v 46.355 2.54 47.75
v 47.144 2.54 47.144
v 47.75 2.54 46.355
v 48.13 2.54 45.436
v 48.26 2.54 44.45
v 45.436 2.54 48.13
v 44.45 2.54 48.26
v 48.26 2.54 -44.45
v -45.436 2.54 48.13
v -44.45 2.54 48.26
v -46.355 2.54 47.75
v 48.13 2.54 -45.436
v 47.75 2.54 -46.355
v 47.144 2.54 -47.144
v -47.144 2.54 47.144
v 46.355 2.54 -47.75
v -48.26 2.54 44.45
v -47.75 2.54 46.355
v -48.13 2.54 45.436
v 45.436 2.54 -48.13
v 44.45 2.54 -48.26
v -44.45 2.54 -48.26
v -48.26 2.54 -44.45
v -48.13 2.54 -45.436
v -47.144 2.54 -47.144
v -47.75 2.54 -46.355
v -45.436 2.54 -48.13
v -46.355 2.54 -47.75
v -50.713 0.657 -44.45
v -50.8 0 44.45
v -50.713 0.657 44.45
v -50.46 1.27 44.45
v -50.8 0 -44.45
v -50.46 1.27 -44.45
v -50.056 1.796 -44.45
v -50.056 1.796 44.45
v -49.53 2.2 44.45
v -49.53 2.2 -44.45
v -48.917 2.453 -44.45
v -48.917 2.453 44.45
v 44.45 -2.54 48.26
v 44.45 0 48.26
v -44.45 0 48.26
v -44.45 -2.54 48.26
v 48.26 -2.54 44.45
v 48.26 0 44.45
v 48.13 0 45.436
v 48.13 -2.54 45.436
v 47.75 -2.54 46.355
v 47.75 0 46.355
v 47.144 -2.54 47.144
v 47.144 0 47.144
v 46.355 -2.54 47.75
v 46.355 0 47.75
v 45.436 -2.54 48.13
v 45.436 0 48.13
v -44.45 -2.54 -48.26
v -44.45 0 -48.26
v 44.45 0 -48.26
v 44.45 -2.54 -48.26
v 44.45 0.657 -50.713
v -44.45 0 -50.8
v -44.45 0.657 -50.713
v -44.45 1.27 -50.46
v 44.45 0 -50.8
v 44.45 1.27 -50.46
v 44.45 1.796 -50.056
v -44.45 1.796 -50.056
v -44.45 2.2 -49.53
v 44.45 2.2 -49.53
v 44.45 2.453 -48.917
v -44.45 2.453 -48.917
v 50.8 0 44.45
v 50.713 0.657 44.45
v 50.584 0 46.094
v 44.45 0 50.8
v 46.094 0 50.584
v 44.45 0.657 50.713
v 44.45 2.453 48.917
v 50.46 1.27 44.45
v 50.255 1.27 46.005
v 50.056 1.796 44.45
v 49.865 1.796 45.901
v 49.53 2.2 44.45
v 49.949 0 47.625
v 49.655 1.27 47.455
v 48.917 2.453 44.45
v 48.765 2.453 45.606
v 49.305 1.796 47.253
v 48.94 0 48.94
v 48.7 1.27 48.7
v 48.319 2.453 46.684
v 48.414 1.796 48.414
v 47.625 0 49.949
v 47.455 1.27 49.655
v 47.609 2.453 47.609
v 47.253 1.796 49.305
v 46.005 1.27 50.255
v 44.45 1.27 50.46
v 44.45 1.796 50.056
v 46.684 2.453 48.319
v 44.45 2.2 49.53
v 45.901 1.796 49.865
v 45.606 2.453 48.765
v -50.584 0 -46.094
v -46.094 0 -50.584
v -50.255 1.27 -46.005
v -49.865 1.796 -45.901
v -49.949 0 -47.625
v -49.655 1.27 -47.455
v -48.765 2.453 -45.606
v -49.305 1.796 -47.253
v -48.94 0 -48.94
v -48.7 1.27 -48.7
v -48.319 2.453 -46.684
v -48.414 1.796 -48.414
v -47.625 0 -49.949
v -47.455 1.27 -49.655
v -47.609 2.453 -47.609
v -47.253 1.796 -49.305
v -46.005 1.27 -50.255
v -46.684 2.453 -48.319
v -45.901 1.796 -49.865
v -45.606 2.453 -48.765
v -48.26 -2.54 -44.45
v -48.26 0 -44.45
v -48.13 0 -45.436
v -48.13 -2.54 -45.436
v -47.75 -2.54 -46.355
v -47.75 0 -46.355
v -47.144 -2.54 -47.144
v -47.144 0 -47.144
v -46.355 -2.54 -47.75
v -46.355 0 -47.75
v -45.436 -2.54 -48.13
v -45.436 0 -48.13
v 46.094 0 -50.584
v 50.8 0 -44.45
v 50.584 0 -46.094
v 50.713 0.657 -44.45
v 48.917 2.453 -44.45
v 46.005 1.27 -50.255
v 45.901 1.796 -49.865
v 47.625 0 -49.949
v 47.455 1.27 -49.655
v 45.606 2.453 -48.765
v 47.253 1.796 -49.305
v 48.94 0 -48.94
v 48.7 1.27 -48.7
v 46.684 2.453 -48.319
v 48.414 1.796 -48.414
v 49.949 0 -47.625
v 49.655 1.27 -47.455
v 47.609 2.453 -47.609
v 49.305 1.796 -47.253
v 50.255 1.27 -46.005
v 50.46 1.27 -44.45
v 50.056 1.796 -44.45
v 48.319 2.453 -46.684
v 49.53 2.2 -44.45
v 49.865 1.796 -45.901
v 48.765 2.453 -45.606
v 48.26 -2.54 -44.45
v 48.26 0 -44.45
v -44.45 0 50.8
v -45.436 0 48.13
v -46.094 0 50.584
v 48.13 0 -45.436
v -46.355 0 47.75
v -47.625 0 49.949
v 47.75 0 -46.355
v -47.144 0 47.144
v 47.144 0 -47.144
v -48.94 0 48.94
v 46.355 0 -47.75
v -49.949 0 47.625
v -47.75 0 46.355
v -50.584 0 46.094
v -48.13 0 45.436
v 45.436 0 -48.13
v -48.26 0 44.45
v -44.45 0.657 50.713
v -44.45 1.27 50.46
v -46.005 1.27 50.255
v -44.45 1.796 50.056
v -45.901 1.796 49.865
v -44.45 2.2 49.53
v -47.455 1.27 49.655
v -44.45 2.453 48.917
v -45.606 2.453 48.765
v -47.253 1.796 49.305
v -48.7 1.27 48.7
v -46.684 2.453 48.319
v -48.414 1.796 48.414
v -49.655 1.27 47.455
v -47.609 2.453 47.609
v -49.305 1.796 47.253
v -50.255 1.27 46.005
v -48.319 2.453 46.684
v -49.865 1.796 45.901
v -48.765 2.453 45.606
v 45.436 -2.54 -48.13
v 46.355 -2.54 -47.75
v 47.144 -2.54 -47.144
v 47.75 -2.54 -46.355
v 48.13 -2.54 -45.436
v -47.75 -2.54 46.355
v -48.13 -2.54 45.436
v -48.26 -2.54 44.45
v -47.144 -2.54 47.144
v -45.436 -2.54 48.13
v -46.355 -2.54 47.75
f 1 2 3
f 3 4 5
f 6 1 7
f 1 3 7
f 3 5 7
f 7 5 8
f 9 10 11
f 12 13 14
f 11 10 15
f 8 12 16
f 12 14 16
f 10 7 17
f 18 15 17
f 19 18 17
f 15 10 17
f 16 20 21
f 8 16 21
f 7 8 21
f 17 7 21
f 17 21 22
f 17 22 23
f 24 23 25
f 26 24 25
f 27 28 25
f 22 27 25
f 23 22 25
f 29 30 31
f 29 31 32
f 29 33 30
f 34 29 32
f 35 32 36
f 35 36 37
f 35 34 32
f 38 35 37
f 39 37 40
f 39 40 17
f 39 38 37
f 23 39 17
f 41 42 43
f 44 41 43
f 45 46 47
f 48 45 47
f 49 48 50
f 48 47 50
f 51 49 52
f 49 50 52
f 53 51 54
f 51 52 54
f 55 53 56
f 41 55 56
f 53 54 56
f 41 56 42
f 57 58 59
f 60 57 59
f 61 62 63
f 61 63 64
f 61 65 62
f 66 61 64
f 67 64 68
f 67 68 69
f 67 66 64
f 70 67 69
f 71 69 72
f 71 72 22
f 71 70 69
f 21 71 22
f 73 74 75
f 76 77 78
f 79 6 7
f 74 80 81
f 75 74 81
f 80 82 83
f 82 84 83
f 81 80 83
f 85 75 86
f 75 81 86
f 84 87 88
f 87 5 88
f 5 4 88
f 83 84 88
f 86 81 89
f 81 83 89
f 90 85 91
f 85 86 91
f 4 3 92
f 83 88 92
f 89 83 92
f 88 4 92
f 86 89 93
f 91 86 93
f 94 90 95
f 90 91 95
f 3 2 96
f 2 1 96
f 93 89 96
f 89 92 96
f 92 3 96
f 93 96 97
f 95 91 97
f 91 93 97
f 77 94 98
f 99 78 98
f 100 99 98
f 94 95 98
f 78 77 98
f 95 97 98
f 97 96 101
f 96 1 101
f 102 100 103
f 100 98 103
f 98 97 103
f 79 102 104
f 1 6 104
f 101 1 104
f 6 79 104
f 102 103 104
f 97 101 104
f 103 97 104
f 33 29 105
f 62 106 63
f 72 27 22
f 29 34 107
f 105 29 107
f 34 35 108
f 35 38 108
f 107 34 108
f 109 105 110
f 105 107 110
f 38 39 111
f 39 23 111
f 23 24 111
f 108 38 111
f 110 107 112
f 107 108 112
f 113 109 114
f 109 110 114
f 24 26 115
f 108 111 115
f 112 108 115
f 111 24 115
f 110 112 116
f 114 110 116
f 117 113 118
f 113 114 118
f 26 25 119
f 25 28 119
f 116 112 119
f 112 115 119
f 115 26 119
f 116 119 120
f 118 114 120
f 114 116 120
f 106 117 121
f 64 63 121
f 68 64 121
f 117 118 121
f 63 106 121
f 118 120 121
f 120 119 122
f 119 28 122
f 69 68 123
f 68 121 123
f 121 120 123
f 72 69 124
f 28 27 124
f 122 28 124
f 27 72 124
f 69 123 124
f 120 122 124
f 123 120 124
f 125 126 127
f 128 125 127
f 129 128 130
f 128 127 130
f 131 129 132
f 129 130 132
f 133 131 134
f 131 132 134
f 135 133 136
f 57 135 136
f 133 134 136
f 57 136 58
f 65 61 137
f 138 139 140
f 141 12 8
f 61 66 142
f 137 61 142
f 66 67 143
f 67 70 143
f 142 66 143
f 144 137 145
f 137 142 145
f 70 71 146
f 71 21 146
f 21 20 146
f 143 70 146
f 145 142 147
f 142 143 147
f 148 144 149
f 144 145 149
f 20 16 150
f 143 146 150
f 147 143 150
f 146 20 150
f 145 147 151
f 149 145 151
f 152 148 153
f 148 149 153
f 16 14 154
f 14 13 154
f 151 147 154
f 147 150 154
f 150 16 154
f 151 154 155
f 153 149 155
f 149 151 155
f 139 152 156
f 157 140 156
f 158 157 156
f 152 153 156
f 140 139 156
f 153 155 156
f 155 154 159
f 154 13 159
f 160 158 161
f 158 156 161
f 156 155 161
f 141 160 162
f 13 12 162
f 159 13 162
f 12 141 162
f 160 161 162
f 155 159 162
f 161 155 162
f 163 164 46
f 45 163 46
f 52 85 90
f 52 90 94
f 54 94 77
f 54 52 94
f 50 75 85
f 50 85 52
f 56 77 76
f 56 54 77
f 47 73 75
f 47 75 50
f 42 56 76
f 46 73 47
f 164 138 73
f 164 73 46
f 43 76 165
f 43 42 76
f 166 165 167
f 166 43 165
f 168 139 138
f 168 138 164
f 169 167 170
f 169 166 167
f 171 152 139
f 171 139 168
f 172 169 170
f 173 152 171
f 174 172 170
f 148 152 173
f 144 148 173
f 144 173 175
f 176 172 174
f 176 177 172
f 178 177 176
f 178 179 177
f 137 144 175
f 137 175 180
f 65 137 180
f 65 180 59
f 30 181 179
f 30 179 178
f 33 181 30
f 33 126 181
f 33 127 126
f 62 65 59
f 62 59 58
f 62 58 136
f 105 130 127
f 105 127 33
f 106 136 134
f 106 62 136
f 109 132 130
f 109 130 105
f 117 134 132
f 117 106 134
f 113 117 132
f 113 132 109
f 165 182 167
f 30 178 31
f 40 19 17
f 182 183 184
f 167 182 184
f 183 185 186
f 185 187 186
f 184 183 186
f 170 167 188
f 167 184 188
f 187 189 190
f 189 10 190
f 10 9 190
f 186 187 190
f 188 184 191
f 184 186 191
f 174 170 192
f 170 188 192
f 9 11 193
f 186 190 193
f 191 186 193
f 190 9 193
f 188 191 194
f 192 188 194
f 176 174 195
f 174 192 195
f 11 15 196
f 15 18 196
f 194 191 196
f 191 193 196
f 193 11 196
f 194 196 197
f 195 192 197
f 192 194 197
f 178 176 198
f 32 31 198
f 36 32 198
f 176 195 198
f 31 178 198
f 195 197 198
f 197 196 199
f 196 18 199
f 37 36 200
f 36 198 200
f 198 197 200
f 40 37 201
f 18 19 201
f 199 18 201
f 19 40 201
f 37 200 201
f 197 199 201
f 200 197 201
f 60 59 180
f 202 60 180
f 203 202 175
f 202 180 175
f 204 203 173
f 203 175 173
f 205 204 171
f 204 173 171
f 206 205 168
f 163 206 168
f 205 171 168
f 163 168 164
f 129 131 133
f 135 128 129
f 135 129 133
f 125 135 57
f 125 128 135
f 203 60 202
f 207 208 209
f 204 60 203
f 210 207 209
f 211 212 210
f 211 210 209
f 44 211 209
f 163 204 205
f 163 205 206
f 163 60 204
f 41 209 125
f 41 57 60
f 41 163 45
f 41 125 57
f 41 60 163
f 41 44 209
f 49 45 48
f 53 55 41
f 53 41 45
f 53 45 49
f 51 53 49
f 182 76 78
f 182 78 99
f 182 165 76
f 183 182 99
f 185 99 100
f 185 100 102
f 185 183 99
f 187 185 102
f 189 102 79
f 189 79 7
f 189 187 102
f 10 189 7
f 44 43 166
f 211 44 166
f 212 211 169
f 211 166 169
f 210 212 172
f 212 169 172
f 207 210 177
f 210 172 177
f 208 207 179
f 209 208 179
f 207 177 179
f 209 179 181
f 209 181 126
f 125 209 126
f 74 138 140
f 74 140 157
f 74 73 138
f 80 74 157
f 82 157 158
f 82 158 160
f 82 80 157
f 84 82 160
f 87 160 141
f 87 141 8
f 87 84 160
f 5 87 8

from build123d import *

# Parameters (mm, degrees)
BOSS_EXTRUDE1_DEPTH = 2.54
BOSS_EXTRUDE2_DEPTH = 2.54
FILLET1_R           = 2.54


with BuildPart() as part:
    # Sketch1 → Boss-Extrude1 (new body)
    with BuildSketch(Plane(origin=(0, 0, 0), x_dir=(1, 0, 0), z_dir=(0, 1, 0))):
        with BuildLine():
            Line((-44.45, 50.8), (44.45, 50.8))
            ThreePointArc((44.45, 50.8), (48.940128061, 48.940128061), (50.8, 44.45))
            Line((50.8, 44.45), (50.8, -44.45))
            ThreePointArc((50.8, -44.45), (48.940128061, -48.940128061), (44.45, -50.8))
            Line((44.45, -50.8), (-44.45, -50.8))
            ThreePointArc((-44.45, -50.8), (-48.940128061, -48.940128061), (-50.8, -44.45))
            Line((-50.8, -44.45), (-50.8, 44.45))
            ThreePointArc((-50.8, 44.45), (-48.940128061, 48.940128061), (-44.45, 50.8))
        make_face()
    extrude(amount=BOSS_EXTRUDE1_DEPTH)

    # Sketch2 → Boss-Extrude2 (add)
    with BuildSketch(Plane.XZ):
        with BuildLine():
            Line((-48.26, 44.45), (-48.26, -44.45))
            ThreePointArc((-48.26, -44.45), (-47.144076836, -47.144076836), (-44.45, -48.26))
            Line((-44.45, -48.26), (44.45, -48.26))
            ThreePointArc((44.45, -48.26), (47.144076836, -47.144076836), (48.26, -44.45))
            Line((48.26, -44.45), (48.26, 44.45))
            ThreePointArc((48.26, 44.45), (47.144076836, 47.144076836), (44.45, 48.26))
            Line((44.45, 48.26), (-44.45, 48.26))
            ThreePointArc((-44.45, 48.26), (-47.144076836, 47.144076836), (-48.26, 44.45))
        make_face()
    extrude(amount=BOSS_EXTRUDE2_DEPTH)

    # Fillet1
    fillet1_edges = [part.edges().sort_by_distance(p)[0] for p in [
        (48.940128061, 2.54, -48.940128061),
        (50.8, 2.54, 0),
        (48.940128061, 2.54, 48.940128061),
        (0, 2.54, 50.8),
        (-48.940128061, 2.54, 48.940128061),
        (-50.8, 2.54, 0),
        (-48.940128061, 2.54, -48.940128061),
        (0, 2.54, -50.8),
    ]]
    fillet(fillet1_edges, radius=FILLET1_R - 0.0001)  # a hair under: the kernel refuses the full size


solid = part.part
